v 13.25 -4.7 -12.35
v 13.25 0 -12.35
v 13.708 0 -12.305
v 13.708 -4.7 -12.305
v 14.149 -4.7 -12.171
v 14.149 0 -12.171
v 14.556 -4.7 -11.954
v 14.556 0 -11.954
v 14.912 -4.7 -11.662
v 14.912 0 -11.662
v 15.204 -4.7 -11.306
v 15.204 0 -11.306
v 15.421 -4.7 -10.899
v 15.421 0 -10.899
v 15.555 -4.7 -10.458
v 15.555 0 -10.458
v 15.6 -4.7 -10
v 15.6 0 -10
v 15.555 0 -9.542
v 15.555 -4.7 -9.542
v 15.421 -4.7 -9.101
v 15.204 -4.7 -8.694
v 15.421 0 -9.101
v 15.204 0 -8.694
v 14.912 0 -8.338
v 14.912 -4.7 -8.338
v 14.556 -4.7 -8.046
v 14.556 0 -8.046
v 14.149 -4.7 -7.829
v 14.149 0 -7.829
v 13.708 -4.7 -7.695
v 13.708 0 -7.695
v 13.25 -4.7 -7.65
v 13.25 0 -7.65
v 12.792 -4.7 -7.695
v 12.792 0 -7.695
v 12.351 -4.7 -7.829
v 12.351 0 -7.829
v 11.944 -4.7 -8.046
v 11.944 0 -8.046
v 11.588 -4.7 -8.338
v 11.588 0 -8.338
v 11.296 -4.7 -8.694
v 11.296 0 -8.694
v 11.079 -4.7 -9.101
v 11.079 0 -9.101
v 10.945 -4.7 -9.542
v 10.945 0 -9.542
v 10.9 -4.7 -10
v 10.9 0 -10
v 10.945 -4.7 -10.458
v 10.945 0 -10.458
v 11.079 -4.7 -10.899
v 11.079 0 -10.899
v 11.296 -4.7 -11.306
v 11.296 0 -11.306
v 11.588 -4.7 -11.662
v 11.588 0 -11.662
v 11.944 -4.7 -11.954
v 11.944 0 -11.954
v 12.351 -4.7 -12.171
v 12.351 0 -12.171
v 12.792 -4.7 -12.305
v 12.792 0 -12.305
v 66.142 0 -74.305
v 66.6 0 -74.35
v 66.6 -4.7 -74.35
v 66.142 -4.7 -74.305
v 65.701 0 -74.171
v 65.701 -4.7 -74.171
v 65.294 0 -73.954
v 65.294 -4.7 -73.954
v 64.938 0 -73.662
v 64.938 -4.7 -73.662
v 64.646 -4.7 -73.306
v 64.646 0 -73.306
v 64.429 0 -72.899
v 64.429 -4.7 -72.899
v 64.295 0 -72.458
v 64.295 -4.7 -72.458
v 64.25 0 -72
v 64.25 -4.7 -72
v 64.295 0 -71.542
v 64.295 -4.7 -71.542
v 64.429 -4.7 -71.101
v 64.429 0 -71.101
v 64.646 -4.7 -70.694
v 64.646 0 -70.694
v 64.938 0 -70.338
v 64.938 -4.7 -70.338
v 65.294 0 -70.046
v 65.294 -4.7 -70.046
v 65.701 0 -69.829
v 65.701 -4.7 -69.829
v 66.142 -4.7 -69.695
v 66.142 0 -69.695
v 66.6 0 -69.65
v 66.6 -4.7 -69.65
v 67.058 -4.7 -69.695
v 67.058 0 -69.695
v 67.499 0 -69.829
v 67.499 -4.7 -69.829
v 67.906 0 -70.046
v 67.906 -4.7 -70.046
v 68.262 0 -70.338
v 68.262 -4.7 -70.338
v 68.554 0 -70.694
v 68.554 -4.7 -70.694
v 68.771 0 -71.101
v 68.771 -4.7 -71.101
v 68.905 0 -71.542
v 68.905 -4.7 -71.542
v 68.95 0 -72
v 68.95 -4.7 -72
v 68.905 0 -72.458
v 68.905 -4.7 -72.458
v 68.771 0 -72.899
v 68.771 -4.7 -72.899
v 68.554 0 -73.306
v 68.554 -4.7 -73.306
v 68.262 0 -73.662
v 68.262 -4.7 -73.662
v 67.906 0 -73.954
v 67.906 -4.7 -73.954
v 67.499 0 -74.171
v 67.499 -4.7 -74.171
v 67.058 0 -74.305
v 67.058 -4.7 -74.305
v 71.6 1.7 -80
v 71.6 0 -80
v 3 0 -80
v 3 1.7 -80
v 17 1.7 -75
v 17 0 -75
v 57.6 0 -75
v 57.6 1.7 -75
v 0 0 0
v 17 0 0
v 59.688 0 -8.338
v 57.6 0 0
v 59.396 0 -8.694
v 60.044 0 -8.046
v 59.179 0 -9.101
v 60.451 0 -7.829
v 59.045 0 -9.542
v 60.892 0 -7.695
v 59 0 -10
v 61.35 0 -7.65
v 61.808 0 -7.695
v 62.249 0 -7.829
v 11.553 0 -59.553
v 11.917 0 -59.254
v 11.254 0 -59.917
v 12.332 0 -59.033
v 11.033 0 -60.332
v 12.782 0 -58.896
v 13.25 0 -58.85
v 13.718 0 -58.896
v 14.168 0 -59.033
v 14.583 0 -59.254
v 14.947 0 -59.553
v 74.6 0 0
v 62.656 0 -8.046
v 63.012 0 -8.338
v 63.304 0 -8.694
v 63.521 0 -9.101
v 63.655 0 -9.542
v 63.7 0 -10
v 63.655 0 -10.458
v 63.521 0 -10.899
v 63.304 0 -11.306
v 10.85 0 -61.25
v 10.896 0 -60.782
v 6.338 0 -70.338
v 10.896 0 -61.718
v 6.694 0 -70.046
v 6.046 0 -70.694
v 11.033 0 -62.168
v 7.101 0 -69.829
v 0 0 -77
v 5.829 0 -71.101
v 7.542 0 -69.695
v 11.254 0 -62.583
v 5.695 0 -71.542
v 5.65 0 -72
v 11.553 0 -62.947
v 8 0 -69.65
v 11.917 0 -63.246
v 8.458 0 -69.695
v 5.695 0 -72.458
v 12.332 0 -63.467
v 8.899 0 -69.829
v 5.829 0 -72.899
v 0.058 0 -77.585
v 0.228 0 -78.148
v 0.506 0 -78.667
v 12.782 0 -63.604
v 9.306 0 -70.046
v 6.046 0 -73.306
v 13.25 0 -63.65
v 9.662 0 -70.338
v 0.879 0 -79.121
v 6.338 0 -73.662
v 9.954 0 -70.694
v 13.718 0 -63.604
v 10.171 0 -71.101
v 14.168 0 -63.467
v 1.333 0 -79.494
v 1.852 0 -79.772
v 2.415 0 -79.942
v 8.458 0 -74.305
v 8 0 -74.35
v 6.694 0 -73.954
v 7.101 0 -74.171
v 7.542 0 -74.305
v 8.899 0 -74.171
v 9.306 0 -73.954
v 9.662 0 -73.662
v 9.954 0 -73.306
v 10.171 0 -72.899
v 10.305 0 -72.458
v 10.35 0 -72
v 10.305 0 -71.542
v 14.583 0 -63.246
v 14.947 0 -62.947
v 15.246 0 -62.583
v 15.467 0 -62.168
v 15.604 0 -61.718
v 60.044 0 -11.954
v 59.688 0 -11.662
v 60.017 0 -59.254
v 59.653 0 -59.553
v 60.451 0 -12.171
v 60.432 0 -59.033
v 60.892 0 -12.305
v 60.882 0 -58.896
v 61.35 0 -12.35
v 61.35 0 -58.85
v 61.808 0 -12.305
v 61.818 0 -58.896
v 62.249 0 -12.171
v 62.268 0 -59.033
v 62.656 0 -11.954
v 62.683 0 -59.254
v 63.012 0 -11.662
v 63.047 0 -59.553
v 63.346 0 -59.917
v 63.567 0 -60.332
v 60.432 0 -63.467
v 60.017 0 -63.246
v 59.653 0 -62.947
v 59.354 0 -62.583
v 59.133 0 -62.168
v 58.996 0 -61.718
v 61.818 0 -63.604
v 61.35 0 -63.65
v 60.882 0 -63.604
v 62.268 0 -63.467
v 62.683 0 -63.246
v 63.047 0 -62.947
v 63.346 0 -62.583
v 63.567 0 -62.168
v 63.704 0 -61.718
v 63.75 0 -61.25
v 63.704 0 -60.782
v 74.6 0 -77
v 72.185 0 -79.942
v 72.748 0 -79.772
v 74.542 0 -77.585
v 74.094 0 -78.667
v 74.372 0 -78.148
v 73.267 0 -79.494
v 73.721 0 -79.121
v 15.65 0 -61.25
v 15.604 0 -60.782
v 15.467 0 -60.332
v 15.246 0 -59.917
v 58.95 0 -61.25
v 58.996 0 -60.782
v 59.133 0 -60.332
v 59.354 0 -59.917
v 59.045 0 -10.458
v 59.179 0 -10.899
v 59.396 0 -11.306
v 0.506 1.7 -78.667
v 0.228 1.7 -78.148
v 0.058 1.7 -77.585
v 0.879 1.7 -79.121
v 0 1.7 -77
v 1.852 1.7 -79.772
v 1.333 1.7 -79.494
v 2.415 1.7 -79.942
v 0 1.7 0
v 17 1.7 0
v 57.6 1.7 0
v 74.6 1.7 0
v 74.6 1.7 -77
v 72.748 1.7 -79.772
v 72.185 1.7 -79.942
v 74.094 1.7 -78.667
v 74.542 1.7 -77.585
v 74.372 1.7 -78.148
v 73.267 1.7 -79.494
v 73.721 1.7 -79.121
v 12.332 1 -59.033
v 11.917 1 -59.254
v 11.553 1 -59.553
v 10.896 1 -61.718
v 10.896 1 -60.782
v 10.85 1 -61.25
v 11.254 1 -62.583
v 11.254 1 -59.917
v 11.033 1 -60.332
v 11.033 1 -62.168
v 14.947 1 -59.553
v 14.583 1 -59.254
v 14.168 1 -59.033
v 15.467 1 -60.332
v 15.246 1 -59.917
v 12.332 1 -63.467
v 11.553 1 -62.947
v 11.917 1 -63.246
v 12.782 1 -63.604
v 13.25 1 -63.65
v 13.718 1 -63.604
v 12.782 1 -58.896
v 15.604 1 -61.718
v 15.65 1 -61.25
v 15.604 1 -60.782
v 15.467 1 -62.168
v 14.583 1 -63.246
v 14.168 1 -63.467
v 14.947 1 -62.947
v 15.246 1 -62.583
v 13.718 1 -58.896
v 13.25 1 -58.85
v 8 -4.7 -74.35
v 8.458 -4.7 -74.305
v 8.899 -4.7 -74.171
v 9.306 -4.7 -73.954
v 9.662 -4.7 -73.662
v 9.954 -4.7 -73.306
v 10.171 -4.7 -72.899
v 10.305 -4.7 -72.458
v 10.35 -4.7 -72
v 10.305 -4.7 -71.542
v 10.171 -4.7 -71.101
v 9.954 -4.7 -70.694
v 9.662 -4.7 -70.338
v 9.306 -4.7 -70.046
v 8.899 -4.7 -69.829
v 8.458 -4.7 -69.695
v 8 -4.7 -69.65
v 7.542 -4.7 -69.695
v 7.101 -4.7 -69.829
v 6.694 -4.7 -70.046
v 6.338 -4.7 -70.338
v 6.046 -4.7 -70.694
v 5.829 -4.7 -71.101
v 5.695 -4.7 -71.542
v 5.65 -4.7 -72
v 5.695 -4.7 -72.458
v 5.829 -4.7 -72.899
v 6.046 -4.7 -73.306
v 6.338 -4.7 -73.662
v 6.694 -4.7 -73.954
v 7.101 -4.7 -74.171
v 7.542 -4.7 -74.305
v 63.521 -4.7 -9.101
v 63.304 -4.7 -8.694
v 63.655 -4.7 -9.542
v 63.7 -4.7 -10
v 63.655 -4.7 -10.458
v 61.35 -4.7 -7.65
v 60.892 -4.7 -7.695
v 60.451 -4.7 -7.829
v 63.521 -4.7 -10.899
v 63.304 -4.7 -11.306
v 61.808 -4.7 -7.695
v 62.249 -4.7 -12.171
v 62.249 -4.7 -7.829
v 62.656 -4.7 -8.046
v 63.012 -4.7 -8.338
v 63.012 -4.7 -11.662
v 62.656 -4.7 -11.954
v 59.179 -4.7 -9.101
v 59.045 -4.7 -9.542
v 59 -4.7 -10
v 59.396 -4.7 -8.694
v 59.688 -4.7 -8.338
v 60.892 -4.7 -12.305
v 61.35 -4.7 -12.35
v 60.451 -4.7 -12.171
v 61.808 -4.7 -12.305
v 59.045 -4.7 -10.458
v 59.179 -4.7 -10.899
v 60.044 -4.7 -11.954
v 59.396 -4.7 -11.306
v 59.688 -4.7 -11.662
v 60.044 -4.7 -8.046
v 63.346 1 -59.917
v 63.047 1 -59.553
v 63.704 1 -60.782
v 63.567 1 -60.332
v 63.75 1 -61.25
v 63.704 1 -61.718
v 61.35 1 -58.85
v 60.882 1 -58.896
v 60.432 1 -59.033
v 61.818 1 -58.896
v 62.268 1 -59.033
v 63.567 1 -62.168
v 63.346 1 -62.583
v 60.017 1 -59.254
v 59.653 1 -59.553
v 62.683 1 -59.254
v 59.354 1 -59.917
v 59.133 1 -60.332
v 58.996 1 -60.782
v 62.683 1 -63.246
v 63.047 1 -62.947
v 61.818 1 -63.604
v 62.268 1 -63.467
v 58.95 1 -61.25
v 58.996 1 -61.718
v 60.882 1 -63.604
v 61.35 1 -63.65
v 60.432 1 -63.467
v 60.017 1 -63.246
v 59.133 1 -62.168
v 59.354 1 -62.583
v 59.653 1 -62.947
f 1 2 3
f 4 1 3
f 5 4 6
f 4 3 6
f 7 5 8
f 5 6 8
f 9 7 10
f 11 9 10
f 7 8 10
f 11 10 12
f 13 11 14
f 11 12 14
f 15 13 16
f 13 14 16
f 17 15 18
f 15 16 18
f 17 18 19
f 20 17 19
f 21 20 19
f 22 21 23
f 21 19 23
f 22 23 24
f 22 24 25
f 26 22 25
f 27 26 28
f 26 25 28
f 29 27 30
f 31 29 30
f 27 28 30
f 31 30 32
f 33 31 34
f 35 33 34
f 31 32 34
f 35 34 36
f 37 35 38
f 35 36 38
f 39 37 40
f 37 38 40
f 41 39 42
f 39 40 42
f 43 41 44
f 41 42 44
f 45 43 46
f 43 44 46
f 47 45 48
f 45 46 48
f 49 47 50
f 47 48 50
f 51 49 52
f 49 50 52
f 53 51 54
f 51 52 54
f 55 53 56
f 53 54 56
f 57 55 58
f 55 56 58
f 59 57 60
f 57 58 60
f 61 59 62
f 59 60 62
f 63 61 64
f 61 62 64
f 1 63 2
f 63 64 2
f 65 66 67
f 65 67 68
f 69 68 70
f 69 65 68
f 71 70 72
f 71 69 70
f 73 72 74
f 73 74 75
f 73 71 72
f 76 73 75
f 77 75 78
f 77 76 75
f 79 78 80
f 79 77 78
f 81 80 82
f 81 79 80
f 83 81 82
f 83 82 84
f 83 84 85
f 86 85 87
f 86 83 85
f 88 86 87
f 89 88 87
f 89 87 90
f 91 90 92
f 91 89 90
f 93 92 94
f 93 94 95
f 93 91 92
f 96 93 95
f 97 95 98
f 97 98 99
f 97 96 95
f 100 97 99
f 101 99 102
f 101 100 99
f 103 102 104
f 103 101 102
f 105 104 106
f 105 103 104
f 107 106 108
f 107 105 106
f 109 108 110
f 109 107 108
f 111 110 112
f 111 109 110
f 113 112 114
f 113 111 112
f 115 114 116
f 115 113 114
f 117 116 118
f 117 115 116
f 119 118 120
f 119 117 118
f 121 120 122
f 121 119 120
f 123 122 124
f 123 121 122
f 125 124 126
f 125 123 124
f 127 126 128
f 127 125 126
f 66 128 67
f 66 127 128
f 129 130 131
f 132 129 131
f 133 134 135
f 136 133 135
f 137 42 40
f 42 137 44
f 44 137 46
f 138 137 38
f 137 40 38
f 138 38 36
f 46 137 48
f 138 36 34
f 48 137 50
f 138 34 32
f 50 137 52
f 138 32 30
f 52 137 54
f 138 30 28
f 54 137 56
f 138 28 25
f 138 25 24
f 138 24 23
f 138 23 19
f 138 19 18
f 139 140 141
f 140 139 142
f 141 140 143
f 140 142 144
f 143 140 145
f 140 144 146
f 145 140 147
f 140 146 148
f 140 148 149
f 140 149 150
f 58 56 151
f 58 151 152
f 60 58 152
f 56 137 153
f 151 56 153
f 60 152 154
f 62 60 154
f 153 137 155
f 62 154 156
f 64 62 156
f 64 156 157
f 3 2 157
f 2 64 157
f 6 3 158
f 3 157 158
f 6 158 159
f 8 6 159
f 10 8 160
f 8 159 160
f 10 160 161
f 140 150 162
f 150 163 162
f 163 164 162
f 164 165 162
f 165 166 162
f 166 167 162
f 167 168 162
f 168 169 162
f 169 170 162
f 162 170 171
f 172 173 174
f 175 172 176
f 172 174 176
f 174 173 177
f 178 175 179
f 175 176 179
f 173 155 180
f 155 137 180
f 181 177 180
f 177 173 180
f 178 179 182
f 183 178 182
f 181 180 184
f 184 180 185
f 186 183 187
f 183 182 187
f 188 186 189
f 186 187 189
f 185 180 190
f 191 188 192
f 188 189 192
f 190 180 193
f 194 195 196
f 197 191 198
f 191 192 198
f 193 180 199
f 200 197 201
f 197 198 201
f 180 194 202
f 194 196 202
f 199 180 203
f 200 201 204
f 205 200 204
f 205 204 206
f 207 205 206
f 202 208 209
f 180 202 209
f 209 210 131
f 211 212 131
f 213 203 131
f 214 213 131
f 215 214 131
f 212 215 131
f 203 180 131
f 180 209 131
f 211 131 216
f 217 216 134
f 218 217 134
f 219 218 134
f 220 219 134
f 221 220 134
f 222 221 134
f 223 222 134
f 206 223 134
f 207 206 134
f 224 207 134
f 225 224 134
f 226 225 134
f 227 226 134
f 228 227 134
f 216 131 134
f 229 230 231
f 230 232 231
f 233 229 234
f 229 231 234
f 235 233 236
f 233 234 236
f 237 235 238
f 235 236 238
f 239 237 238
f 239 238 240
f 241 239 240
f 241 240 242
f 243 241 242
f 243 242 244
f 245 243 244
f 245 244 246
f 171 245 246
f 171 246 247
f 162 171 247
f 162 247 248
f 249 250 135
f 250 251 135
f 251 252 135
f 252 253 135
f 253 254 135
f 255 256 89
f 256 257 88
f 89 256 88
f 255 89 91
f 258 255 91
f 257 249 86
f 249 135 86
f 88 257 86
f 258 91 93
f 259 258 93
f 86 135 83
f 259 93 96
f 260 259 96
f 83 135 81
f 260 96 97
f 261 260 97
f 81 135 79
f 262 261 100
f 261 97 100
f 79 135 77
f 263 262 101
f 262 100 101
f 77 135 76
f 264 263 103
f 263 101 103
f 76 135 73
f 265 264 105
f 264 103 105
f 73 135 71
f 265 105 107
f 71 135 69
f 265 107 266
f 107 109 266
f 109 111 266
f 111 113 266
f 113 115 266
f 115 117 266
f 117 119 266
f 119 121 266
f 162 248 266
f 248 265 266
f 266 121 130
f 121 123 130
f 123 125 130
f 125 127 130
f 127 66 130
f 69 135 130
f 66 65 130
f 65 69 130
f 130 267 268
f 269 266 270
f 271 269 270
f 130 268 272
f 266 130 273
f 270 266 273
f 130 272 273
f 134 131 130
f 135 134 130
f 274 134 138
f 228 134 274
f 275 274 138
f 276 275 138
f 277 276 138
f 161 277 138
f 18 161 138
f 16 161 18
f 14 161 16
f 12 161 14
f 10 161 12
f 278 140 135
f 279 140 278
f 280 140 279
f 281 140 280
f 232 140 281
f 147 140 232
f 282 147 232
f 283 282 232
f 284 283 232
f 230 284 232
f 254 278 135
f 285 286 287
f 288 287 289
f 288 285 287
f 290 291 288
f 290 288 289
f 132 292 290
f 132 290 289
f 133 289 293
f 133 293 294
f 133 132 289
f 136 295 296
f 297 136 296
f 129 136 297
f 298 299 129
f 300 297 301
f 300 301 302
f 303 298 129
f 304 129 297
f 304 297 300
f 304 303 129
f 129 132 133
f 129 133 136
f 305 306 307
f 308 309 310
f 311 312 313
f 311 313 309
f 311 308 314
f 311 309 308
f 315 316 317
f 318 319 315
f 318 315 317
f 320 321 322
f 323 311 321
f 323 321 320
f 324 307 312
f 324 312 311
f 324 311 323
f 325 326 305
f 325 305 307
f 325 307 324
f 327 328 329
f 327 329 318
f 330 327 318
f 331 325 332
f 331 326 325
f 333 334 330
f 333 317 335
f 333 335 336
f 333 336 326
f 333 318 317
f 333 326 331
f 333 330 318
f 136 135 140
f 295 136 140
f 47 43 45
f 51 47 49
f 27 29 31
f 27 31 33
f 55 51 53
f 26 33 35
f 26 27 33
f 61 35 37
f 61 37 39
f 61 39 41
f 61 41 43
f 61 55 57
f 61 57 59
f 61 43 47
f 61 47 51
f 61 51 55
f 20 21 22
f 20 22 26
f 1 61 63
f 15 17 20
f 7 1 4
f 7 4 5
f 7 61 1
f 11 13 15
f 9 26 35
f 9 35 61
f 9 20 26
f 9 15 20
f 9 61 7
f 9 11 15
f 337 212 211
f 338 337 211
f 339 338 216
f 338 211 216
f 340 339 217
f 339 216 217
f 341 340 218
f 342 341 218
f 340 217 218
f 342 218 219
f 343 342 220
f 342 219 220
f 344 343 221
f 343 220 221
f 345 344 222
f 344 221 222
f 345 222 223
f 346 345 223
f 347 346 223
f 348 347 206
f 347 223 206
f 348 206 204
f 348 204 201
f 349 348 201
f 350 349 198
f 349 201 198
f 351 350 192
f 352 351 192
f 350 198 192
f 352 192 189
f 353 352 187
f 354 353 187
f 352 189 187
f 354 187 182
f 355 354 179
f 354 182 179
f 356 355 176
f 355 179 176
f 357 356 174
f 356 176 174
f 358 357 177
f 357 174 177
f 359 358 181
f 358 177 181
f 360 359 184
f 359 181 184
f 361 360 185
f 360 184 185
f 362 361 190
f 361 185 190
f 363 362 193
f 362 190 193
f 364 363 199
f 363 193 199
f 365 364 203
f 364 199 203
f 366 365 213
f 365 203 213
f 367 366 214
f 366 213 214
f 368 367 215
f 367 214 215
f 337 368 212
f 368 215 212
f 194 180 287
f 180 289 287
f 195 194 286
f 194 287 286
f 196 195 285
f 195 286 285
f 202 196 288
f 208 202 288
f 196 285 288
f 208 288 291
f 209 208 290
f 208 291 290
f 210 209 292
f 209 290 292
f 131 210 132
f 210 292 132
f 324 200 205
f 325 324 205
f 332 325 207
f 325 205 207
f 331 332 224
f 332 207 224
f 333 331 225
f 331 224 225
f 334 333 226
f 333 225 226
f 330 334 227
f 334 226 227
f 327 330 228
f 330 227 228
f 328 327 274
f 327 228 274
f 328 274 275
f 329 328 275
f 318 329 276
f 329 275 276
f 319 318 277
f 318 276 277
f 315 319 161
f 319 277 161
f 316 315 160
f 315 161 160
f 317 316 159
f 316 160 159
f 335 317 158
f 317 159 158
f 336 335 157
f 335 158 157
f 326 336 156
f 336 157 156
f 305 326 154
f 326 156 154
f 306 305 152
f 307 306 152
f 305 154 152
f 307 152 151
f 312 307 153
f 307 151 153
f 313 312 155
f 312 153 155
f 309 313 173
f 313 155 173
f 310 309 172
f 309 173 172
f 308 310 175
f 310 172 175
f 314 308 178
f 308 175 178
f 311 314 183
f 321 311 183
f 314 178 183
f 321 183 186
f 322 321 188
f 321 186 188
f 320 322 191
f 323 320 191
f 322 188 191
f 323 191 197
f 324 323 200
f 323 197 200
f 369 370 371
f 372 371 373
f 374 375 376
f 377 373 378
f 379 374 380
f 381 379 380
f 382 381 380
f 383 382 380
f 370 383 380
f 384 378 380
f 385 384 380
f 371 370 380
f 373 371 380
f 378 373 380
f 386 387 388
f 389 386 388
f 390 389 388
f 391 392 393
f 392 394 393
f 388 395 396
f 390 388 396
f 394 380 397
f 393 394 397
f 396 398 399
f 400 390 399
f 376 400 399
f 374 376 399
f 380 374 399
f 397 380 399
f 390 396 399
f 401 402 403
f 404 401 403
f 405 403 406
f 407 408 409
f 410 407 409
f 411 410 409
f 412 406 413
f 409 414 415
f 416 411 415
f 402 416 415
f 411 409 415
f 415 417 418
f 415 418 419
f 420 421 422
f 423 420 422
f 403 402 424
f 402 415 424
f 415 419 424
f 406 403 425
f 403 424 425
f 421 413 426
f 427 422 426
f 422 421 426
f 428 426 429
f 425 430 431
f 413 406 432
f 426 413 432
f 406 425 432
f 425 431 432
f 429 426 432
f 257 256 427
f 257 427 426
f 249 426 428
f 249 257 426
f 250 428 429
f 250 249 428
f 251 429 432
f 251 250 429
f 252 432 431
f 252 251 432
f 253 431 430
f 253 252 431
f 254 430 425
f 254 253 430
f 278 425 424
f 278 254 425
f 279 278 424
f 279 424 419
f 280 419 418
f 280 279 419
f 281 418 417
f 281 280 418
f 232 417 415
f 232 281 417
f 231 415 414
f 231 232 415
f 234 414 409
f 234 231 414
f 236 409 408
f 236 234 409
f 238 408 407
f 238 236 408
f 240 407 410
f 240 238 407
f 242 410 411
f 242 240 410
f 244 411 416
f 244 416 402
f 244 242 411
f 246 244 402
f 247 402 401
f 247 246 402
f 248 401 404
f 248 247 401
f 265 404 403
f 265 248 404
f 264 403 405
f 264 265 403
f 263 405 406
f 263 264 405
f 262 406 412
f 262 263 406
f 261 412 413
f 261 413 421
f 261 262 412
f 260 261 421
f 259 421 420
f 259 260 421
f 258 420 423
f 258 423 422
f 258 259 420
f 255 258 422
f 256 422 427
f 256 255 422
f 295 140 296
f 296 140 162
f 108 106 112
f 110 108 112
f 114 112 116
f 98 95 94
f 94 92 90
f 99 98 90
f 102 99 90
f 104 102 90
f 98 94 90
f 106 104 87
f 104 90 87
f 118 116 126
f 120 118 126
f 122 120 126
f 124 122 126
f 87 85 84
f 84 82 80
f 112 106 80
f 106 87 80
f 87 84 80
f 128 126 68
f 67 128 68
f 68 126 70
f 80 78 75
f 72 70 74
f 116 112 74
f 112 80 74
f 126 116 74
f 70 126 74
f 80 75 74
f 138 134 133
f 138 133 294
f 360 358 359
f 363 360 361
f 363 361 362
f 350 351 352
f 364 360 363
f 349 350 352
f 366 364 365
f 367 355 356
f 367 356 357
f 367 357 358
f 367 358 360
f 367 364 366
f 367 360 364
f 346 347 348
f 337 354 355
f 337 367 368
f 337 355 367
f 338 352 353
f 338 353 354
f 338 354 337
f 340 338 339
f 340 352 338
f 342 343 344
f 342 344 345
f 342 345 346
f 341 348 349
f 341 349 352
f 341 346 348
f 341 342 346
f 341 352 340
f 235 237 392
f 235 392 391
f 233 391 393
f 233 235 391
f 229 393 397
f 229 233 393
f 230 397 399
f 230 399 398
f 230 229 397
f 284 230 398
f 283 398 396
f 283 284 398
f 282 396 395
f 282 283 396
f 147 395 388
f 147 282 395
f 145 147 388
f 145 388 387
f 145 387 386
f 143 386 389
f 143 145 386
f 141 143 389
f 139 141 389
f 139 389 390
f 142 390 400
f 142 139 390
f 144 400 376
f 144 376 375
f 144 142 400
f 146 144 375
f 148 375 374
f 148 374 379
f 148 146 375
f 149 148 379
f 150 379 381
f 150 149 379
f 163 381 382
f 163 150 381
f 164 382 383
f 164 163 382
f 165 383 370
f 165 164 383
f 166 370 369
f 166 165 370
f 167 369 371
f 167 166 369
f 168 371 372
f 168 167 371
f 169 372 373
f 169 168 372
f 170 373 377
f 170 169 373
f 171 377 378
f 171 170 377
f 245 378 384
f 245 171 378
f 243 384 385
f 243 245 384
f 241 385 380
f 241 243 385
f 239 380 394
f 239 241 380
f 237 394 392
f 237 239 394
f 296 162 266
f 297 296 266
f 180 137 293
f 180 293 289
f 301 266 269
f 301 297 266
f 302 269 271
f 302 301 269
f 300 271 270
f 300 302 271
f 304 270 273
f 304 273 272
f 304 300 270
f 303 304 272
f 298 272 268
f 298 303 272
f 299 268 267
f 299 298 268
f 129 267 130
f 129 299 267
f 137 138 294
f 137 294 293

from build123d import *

# Parameters (mm, degrees)
BOSS_EXTRUDE1_DEPTH = 1.7
SKETCH2_R           = 2.35
BOSS_EXTRUDE2_DEPTH = 4.7
FILLET1_R           = 3
SKETCH3_R           = 2.4
CUT_EXTRUDE1_DEPTH  = 1


with BuildPart() as part:
    # Sketch1 → Boss-Extrude1 (new body)
    with BuildSketch(Plane(origin=(0, 0, 0), x_dir=(1, 0, 0), z_dir=(0, 1, 0))):
        Polygon((0, 0), (0, 80), (37.3, 80), (37.3, 75), (17, 75), (17, 0), align=None)
    extrude(amount=BOSS_EXTRUDE1_DEPTH)

    # Sketch2 → Boss-Extrude2 (add)
    with BuildSketch(Plane(origin=(0, 0, 0), x_dir=(-1, 0, 0), z_dir=(0, -1, 0))):
        with Locations(Location((-13.25, 10, 0), (0, 0, 90))):
            Circle(SKETCH2_R)
        with Locations(Location((-8, 72, 0), (0, 0, 90))):
            Circle(SKETCH2_R)
    extrude(amount=BOSS_EXTRUDE2_DEPTH)

    # Fillet1
    fillet1_edges = [part.edges().sort_by_distance(p)[0] for p in [
        (0, 0.85, -80),
    ]]
    fillet(fillet1_edges, radius=FILLET1_R)

    # Sketch3 → Cut-Extrude1 (cut)
    with BuildSketch(Plane(origin=(0, 0, 0), x_dir=(-1, 0, 0), z_dir=(0, -1, 0))):
        with Locations(Location((-13.25, 61.25, 0), (0, 0, 90))):
            Circle(SKETCH3_R)
    extrude(amount=-CUT_EXTRUDE1_DEPTH, mode=Mode.SUBTRACT)

    # Mirror3: part across plane


with BuildPart() as part_1:
    add(part.part)
    add(part.part.mirror(Plane(origin=(37.3, 1.7, -80), x_dir=(0, 0, 1), z_dir=(-1, 0, 0))))


solid = part_1.part
